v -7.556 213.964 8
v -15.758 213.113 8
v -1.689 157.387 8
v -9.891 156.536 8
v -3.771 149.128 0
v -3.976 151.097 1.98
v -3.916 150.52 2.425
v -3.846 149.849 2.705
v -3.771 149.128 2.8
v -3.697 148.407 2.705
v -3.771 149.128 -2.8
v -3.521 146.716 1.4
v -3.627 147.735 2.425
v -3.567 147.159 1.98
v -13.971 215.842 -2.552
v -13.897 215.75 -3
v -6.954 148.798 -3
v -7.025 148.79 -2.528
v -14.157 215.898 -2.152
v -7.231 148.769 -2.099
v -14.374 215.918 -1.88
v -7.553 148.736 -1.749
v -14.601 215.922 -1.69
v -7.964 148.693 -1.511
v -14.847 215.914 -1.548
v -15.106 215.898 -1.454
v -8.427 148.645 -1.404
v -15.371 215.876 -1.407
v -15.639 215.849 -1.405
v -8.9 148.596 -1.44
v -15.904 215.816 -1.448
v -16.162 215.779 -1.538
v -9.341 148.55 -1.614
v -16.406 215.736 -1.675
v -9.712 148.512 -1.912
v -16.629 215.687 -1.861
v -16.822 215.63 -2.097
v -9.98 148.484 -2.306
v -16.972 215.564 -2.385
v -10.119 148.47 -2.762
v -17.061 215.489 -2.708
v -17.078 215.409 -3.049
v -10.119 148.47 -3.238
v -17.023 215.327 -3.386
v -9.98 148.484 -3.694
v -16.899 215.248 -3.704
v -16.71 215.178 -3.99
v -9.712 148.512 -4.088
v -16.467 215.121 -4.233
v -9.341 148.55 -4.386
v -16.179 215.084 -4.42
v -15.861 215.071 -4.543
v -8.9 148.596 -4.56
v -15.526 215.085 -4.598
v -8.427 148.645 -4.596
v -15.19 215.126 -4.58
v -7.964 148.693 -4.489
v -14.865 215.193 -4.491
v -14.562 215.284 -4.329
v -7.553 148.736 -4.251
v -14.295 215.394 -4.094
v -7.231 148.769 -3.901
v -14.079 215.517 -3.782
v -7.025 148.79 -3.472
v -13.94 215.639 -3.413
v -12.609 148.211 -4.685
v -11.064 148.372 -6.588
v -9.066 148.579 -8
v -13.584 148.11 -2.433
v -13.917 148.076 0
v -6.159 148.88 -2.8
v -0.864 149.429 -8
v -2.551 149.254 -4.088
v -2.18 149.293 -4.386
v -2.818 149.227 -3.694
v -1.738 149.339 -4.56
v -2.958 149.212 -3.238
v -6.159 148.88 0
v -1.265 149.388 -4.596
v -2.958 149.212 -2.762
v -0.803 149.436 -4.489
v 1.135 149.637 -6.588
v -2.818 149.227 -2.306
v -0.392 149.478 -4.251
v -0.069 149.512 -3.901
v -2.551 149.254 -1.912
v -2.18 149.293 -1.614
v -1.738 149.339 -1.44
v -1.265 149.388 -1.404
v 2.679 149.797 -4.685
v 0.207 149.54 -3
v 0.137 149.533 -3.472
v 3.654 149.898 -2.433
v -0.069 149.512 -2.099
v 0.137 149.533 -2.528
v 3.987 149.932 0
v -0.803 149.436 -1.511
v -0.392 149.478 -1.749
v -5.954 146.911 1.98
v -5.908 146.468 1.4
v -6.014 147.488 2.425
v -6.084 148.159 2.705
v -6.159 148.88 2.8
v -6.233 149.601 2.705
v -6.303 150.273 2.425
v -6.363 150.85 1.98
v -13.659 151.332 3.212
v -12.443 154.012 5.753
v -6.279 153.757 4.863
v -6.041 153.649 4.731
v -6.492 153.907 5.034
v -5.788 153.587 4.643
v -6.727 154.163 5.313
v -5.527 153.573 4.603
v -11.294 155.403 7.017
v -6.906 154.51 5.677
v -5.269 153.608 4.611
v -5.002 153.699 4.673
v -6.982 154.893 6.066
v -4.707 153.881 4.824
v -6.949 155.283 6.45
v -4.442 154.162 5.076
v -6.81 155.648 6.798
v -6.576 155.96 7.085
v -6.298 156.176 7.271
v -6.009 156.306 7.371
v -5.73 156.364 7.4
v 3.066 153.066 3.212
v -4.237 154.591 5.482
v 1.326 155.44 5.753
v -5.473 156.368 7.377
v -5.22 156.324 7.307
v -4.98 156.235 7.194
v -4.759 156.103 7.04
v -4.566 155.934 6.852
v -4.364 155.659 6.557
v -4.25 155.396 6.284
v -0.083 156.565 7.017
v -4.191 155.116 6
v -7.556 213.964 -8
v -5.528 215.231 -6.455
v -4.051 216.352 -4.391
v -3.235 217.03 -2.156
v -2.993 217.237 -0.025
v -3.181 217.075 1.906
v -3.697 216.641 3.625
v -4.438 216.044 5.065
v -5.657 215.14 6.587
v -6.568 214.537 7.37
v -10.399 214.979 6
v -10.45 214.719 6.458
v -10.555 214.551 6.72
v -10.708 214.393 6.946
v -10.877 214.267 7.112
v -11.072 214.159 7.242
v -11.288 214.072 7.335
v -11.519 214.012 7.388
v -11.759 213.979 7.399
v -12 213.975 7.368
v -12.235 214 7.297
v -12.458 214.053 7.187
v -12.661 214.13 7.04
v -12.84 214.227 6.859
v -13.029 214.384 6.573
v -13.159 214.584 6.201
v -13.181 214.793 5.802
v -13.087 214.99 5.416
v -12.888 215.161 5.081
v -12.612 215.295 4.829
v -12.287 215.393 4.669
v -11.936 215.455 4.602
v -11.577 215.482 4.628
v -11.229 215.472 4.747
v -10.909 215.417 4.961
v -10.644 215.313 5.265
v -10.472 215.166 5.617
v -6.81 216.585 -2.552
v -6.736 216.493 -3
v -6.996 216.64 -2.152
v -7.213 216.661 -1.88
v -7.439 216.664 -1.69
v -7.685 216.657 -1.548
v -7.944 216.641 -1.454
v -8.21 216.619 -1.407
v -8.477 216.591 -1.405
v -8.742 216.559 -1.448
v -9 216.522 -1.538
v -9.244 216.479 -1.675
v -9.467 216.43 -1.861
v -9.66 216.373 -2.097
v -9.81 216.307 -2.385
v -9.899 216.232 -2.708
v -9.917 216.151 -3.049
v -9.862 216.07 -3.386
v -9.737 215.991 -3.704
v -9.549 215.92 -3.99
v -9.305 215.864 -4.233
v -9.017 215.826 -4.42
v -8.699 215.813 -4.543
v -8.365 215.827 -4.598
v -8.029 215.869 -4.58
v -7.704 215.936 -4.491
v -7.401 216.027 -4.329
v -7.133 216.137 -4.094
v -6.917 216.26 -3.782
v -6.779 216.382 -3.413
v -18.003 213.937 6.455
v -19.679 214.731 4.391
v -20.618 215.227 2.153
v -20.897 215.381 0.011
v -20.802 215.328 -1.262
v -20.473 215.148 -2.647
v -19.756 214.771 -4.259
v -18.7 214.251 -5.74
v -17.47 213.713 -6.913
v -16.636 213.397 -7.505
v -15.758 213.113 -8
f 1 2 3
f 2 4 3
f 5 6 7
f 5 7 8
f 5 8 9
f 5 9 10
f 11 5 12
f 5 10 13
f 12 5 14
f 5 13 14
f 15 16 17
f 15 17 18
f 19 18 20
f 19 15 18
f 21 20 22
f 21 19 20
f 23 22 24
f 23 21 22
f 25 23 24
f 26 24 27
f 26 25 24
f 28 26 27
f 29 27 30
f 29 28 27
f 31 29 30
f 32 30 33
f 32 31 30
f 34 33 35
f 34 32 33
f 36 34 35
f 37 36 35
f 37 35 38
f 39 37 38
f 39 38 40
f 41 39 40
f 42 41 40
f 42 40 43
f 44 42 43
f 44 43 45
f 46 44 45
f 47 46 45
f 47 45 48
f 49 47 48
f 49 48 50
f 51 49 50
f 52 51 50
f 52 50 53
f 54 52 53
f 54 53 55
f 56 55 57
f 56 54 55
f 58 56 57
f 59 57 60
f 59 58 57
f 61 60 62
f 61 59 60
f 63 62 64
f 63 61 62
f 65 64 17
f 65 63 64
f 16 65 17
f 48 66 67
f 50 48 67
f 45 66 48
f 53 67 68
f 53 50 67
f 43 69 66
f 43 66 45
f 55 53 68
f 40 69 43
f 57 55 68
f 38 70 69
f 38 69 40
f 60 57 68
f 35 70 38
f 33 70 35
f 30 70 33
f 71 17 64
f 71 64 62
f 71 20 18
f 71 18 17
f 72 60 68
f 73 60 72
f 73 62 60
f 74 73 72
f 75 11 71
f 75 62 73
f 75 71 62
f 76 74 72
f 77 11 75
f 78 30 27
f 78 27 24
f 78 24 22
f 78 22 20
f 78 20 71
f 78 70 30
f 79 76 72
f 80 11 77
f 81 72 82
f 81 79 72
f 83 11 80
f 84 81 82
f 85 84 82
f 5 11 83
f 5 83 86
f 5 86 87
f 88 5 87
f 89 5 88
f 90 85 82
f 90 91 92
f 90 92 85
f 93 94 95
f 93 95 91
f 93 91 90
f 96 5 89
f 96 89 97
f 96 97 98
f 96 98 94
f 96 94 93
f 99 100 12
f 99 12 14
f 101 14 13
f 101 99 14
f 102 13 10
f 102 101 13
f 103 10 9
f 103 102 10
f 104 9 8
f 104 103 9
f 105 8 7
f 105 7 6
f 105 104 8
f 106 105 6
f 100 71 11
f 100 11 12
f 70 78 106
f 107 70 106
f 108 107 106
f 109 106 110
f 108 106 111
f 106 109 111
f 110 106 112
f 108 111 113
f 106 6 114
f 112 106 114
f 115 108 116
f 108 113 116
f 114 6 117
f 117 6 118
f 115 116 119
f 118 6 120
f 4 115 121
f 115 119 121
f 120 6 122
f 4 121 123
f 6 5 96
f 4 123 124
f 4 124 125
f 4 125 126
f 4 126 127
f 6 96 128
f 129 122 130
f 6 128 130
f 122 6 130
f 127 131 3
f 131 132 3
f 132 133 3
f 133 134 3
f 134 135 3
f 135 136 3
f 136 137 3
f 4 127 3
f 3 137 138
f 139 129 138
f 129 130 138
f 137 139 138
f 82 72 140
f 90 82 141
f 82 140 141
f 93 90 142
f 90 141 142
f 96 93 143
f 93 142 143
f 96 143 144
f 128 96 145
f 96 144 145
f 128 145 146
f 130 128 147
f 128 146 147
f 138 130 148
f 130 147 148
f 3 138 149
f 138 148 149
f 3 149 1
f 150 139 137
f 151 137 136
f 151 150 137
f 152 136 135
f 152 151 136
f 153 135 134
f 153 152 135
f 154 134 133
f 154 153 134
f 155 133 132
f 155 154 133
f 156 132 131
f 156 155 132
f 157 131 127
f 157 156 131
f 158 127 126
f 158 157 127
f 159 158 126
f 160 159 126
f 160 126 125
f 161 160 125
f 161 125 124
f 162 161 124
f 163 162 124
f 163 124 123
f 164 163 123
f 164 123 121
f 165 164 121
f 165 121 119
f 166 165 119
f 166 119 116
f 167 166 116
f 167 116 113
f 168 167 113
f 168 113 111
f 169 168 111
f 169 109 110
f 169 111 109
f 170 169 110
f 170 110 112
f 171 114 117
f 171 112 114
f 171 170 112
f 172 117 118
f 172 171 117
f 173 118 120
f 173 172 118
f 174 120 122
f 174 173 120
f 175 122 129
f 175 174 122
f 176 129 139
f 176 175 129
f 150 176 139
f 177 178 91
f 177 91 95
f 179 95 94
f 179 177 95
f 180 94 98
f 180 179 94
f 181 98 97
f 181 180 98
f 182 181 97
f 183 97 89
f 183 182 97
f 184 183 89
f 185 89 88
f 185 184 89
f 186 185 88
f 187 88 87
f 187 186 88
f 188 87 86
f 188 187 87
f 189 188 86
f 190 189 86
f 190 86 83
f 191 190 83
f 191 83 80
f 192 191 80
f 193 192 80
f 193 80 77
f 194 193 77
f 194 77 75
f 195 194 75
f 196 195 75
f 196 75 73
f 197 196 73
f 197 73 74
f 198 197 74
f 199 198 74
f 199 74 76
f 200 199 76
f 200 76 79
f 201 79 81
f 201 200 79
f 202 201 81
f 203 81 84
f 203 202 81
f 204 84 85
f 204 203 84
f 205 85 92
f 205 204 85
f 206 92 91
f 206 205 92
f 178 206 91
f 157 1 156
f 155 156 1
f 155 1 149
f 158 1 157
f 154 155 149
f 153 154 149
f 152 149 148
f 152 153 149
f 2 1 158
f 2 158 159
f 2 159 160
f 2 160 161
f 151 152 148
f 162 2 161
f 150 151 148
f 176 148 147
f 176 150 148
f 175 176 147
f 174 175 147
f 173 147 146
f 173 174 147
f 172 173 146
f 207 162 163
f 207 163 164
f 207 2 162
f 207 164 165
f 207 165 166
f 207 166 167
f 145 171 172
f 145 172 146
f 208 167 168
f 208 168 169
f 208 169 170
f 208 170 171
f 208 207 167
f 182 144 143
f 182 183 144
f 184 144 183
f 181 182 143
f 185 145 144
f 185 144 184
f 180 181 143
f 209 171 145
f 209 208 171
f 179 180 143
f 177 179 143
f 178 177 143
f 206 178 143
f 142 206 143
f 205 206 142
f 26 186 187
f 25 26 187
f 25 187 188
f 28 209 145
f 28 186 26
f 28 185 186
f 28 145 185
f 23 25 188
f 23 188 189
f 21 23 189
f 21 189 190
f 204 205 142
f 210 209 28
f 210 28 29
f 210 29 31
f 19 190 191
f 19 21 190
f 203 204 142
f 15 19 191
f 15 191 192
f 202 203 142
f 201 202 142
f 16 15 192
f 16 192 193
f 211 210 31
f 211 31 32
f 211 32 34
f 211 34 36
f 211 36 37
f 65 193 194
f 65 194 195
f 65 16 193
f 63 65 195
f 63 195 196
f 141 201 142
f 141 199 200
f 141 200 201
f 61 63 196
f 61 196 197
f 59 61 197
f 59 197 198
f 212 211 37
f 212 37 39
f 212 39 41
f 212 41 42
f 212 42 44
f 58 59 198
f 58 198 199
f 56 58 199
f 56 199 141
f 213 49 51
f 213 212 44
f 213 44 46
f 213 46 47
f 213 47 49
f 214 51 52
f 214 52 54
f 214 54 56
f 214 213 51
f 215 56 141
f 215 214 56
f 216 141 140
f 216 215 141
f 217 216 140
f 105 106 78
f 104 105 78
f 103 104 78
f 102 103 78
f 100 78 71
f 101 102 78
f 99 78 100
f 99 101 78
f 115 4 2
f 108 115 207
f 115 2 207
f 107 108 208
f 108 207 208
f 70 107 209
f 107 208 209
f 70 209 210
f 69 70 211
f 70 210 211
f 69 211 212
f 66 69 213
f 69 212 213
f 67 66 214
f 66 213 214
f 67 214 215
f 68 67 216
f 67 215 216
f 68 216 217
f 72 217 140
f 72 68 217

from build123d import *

# Parameters (mm, degrees)
SKETCH3_R               = 9
BOSS_EXTRUDE1_DEPTH     = 69
CUT_EXTRUDE1_DEPTH      = 220.929043992
CUT_EXTRUDE1_DEPTH_BACK = 220.929043992
CUT_EXTRUDE2_DEPTH      = 219.597133119
CUT_EXTRUDE2_DEPTH_BACK = 219.597133119
BOSS_EXTRUDE3_DEPTH     = 1.2
SKETCH8_R               = 1.6
SKETCH8_R_2             = 1.4
CUT_EXTRUDE3_DEPTH      = 74.512311312
CUT_EXTRUDE3_DEPTH_BACK = 74.512311312
CUT_EXTRUDE4_DEPTH      = 73.514420315


with BuildPart() as part:
    # Sketch3 → Boss-Extrude1 (new body)
    with BuildSketch(Plane(origin=(-12.082314344, 217.636022384, 0), x_dir=(-0.9946657577296572, -0.10315052302381673, 0), z_dir=(0.10315052302381673, -0.9946657577296572, 0))):
        with Locations(Location((0, 0, 0), (0, 0, 180))):
            Circle(SKETCH3_R)
    extrude(amount=BOSS_EXTRUDE1_DEPTH)

    # Sketch4 → Cut-Extrude1 (cut, two sides)
    with BuildSketch(Plane(origin=(10.375761543, 1.076004901, 0), x_dir=(0.10315052302381672, -0.9946657577296572, 0), z_dir=(-0.9946657577296572, -0.10315052302381673, 0))) as cut_extrude1_sk:
        with BuildLine():
            Line((-217.721396158, 9), (-212.721396158, 9))
            ThreePointArc((-212.721396158, 9), (-216.387282909, 0), (-212.721396158, -9))
            Line((-212.721396158, -9), (-217.721396158, -9))
            Line((-217.721396158, -9), (-217.721396158, 9))
        make_face()
    extrude(amount=CUT_EXTRUDE1_DEPTH, mode=Mode.SUBTRACT)
    extrude(cut_extrude1_sk.sketch, amount=-CUT_EXTRUDE1_DEPTH_BACK, mode=Mode.SUBTRACT)

    # Sketch5 → Cut-Extrude2 (cut, two sides)
    with BuildSketch(Plane(origin=(10.375761543, 1.076004901, 0), x_dir=(0.10315052302381672, -0.9946657577296572, 0), z_dir=(-0.9946657577296572, -0.10315052302381673, 0))) as cut_extrude2_sk:
        Polygon((-148.721396158, 0), (-157.721396158, 9), (-148.721396158, 9), align=None)
    extrude(amount=CUT_EXTRUDE2_DEPTH, mode=Mode.SUBTRACT)
    extrude(cut_extrude2_sk.sketch, amount=-CUT_EXTRUDE2_DEPTH_BACK, mode=Mode.SUBTRACT)

    # Sketch7 → Boss-Extrude3 (add, symmetric)
    with BuildSketch(Plane(origin=(10.375761543, 1.076004901, 0), x_dir=(0.10315052302381672, -0.9946657577296572, 0), z_dir=(-0.9946657577296572, -0.10315052302381673, 0))):
        with BuildLine():
            Line((-151.519146847, 0.112209978), (-148.721396158, 0))
            Line((-148.721396158, 0), (-148.721396158, -2.8))
            Line((-148.721396158, -2.8), (-146.296525027, 1.4))
            ThreePointArc((-146.296525027, 1.4), (-149.391739784, 2.718573049), (-151.519146847, 0.112209978))
        make_face()
    extrude(amount=BOSS_EXTRUDE3_DEPTH, both=True)

    # Sketch8 → Cut-Extrude3 (cut, two sides)
    with BuildSketch(Plane(origin=(-12.082314344, 217.636022384, 0), x_dir=(-0.9946657577296572, -0.10315052302381673, 0), z_dir=(0.10315052302381673, -0.9946657577296572, 0))) as cut_extrude3_sk:
        with Locations(Location((-3.6, 3, 0), (0, 0, 180))):
            Circle(SKETCH8_R)
        with Locations(Location((3.6, 3, 0), (0, 0, 180))):
            Circle(SKETCH8_R)
        with Locations(Location((0, -6, 0), (0, 0, 180))):
            Circle(SKETCH8_R_2)
    extrude(amount=CUT_EXTRUDE3_DEPTH, mode=Mode.SUBTRACT)
    extrude(cut_extrude3_sk.sketch, amount=-CUT_EXTRUDE3_DEPTH_BACK, mode=Mode.SUBTRACT)

    # Sketch9 → Cut-Extrude4 (cut, through all)
    with BuildSketch(Plane(origin=(-15.340689799, 147.9280802, 0), x_dir=(0.9946657577296572, 0.10315052302381673, 0), z_dir=(0.10315052302381673, -0.9946657577296572, 0))):
        with BuildLine():
            Line((6.30829956, -8), (14.554510811, -8))
            ThreePointArc((14.554510811, -8), (10.431405186, -9), (6.30829956, -8))
        make_face()
        with BuildLine():
            Line((6.30829956, 8), (14.554510811, 8))
            ThreePointArc((14.554510811, 8), (10.431405186, 9), (6.30829956, 8))
        make_face()
    extrude(amount=-CUT_EXTRUDE4_DEPTH, mode=Mode.SUBTRACT)


solid = part.part
